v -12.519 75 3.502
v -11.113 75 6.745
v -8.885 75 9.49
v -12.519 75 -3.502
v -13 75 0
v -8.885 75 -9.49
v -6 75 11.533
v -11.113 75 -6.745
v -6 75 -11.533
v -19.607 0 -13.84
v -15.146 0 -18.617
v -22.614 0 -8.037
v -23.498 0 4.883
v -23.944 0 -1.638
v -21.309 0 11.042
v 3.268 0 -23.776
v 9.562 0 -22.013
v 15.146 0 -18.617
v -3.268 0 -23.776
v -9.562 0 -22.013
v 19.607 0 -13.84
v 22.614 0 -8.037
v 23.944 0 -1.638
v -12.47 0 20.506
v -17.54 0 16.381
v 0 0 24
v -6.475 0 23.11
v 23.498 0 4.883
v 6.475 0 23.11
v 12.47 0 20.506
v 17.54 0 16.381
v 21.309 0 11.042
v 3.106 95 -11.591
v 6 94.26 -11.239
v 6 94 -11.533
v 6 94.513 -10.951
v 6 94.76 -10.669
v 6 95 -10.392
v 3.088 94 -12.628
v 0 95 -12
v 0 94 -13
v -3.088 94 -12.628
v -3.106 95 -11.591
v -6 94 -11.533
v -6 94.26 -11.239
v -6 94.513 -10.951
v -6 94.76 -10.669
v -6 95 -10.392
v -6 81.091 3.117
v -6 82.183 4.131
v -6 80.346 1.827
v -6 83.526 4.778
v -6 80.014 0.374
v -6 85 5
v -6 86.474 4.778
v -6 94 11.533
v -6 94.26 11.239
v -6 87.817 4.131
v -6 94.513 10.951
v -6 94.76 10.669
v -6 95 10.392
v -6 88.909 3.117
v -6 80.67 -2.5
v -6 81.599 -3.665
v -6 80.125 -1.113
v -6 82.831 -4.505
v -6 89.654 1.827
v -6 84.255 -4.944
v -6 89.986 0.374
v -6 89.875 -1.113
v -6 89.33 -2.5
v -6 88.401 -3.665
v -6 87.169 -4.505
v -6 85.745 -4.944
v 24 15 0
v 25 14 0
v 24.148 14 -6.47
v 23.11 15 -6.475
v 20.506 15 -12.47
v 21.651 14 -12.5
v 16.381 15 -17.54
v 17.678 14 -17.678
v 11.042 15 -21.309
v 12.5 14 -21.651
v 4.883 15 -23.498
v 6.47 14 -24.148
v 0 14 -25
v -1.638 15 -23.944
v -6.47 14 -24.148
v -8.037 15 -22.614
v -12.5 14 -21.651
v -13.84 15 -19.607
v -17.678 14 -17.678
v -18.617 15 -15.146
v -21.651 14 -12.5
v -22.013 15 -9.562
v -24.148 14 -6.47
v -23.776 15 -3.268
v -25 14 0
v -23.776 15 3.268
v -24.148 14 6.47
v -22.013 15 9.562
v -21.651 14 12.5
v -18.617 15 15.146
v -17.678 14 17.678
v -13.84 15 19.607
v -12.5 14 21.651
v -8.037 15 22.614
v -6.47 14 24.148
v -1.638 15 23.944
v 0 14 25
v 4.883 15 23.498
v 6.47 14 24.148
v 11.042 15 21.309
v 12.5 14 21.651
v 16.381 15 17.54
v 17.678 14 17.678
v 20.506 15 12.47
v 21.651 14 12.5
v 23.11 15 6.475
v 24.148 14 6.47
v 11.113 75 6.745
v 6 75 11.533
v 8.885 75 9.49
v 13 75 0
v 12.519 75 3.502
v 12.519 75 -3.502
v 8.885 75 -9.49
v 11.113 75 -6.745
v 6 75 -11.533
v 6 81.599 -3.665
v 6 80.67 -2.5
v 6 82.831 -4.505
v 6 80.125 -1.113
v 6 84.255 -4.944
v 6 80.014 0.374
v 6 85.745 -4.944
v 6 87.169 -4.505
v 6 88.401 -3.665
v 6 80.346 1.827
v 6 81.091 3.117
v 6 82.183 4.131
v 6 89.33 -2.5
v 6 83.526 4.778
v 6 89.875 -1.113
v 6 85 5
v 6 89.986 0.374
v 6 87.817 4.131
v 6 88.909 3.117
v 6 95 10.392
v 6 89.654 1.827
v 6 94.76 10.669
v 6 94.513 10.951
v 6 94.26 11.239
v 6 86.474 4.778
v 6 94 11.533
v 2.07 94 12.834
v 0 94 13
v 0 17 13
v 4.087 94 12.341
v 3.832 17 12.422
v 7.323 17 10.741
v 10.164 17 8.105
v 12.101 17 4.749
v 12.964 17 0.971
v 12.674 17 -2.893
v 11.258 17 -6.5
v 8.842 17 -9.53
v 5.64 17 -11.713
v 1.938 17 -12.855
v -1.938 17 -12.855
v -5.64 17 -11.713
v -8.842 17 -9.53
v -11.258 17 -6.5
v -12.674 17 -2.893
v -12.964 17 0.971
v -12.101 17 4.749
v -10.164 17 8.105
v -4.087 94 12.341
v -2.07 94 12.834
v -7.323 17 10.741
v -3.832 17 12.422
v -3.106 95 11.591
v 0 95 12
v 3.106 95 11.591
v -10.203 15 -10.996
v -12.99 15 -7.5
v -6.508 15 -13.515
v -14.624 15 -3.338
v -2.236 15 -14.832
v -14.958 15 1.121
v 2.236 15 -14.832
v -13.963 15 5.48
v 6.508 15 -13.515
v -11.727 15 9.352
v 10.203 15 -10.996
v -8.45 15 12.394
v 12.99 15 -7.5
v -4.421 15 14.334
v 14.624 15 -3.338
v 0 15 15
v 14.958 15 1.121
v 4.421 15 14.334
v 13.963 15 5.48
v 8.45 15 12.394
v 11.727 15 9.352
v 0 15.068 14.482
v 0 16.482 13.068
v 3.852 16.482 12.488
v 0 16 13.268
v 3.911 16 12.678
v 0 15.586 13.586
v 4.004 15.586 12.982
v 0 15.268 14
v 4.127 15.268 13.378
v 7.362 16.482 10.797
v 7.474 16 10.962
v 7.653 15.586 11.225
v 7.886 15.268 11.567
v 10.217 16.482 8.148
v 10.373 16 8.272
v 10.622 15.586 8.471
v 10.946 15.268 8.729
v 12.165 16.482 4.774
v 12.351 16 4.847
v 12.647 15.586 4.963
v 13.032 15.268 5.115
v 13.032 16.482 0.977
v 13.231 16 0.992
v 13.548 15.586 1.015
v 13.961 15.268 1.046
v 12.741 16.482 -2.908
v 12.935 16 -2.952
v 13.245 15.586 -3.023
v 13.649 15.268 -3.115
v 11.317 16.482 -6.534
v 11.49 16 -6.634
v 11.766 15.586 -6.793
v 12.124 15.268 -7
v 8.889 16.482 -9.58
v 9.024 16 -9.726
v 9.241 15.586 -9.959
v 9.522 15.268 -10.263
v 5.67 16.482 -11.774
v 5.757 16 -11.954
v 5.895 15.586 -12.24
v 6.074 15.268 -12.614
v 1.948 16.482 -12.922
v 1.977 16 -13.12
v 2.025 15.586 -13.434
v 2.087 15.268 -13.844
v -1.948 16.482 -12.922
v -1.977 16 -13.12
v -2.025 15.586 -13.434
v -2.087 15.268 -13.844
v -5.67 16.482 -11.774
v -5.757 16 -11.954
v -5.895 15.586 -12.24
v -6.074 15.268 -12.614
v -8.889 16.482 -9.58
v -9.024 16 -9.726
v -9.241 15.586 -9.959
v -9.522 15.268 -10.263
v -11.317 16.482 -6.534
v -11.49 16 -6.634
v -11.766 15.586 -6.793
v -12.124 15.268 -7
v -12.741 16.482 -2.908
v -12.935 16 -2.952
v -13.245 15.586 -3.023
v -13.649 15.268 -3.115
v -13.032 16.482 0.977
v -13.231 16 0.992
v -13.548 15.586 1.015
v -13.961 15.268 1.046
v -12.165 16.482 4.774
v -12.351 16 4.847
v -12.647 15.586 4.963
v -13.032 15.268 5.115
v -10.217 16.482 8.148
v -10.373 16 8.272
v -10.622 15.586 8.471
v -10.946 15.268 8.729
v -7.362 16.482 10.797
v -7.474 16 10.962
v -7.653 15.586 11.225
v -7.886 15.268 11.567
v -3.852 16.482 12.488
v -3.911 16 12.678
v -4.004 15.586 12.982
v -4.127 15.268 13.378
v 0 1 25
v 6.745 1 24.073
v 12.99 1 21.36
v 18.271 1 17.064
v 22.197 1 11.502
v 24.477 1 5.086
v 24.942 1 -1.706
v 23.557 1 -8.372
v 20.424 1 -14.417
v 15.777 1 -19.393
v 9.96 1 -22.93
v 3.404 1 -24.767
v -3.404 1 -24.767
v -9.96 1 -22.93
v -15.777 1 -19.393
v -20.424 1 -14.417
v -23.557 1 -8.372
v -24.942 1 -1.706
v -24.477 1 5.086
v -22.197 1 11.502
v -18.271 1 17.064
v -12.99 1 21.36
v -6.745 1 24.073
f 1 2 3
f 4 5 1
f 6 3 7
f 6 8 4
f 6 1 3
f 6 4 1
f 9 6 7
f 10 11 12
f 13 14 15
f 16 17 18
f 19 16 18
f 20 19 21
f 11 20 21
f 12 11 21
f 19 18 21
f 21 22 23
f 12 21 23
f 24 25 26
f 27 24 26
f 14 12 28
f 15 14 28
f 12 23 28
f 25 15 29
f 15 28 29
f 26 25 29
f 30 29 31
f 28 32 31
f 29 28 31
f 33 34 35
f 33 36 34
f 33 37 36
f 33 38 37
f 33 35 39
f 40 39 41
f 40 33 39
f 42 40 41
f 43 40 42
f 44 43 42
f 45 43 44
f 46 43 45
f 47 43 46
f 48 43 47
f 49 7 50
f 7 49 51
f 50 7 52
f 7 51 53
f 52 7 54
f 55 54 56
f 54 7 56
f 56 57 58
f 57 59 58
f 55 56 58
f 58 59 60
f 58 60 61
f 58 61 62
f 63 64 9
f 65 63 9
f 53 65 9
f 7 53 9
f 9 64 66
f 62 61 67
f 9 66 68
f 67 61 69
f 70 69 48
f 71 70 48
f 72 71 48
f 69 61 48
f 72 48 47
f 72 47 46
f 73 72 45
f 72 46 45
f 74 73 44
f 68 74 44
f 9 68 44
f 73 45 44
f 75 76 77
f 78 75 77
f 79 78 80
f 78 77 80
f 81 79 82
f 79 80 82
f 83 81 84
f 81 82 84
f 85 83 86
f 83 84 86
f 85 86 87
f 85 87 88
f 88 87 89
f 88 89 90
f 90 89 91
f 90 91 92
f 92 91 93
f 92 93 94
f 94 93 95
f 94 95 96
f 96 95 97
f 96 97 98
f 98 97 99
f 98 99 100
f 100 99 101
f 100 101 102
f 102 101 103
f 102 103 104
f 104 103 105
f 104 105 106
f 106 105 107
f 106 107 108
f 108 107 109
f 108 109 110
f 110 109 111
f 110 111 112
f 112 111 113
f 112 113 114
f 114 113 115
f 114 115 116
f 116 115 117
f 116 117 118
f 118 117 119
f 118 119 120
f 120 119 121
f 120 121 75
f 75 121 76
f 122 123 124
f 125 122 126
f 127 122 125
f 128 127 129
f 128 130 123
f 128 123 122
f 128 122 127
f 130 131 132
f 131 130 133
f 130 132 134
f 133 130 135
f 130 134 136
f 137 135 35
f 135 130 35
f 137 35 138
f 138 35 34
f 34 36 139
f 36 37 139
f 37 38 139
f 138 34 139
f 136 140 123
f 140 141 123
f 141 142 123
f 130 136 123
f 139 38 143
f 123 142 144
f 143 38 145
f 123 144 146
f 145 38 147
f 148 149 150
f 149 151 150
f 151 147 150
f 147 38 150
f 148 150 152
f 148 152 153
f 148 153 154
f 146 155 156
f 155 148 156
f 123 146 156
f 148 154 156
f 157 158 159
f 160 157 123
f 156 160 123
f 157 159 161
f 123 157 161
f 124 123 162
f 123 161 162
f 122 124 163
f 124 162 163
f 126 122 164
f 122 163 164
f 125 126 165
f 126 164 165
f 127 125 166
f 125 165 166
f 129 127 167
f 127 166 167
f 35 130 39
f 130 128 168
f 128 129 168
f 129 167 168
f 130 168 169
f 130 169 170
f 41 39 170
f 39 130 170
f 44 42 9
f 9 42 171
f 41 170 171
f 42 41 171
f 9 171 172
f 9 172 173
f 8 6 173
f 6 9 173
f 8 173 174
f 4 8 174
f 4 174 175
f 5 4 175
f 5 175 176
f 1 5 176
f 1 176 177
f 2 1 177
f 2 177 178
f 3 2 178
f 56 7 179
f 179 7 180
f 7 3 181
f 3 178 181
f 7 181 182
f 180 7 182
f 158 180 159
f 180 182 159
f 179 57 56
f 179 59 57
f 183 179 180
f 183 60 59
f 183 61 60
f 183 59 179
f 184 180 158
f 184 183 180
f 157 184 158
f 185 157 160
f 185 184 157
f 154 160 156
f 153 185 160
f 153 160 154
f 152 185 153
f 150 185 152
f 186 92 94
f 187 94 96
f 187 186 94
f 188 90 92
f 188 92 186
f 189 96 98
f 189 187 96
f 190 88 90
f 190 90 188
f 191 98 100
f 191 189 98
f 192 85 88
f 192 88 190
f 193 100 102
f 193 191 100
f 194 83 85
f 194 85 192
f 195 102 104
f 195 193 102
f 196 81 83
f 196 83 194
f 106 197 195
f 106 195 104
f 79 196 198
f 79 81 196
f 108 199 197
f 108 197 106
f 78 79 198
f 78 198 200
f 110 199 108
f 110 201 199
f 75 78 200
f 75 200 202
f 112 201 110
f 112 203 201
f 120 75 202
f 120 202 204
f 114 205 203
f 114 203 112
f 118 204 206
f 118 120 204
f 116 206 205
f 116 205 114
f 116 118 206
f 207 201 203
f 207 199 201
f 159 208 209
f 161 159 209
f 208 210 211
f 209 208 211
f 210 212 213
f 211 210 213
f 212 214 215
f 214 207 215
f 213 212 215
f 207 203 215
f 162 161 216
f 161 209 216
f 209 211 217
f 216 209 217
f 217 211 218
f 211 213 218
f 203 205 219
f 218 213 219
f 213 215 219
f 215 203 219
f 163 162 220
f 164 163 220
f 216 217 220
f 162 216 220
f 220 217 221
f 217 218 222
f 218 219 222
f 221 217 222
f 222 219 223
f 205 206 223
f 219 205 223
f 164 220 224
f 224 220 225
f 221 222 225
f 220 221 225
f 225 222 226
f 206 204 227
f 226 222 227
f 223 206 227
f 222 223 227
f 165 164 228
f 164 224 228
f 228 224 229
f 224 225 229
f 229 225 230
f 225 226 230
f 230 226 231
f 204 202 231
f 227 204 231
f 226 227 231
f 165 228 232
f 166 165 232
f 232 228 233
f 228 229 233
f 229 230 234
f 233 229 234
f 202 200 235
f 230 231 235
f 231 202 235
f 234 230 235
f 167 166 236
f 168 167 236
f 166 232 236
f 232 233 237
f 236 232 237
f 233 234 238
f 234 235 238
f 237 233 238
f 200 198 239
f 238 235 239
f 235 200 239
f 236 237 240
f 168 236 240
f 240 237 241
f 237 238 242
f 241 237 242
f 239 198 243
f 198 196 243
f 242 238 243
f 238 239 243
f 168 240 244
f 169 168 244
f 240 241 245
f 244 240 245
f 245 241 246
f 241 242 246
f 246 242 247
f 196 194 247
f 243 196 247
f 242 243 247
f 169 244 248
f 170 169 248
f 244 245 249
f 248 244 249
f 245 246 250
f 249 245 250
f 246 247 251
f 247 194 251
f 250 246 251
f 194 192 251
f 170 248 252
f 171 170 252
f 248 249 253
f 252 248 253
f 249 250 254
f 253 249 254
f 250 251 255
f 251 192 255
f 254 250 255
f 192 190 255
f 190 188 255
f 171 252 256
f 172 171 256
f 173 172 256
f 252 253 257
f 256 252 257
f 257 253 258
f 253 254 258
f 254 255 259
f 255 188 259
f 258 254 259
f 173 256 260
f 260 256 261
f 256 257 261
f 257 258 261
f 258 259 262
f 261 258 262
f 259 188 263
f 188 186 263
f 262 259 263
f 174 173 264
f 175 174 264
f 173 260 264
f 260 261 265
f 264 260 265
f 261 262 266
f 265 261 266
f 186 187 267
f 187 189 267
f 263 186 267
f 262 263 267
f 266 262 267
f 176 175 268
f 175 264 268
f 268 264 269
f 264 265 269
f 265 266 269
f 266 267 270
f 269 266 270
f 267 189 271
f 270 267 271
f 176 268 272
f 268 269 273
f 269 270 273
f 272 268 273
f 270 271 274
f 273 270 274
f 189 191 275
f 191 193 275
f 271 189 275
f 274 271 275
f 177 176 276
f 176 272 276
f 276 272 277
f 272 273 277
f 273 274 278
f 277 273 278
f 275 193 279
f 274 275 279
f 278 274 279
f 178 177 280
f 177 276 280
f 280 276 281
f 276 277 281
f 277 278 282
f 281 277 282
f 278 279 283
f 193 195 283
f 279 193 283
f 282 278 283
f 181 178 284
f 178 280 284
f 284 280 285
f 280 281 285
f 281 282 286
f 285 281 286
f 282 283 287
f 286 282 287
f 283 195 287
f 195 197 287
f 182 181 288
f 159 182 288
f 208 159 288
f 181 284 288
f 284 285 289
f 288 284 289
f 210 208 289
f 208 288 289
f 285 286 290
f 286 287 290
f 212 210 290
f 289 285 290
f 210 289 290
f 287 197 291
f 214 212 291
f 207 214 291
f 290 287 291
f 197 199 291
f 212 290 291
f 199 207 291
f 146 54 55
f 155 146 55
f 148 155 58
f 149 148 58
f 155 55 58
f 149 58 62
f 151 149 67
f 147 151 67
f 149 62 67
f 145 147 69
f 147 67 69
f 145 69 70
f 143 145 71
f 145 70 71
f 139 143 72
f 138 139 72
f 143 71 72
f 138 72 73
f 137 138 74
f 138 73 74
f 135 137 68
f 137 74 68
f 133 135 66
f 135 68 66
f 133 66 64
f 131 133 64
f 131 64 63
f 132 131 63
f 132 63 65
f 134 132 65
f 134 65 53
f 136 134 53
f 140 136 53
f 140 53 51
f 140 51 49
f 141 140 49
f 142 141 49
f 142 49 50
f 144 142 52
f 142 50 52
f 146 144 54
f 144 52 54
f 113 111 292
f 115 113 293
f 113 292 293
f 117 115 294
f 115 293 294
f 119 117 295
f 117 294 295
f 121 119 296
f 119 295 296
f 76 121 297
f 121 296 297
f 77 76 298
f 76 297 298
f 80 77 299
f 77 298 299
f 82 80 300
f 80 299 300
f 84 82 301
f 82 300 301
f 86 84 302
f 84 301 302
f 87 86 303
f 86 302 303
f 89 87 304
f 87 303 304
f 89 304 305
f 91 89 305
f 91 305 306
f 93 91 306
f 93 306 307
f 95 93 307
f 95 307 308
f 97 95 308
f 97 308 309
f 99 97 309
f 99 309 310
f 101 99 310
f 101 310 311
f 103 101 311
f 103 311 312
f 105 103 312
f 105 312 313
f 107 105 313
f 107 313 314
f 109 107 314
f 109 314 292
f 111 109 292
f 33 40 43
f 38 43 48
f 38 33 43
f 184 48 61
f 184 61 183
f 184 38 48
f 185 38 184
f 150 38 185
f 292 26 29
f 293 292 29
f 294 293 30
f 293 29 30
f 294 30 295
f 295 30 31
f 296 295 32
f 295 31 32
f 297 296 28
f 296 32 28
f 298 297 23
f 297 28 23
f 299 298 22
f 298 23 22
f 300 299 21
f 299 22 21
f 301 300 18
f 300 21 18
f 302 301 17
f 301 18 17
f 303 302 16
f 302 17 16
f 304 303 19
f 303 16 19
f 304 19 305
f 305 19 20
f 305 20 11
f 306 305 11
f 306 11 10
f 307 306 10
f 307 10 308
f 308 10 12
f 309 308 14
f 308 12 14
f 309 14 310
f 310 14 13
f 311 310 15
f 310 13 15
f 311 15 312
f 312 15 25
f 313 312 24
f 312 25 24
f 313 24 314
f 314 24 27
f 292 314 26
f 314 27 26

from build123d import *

# Parameters (mm, degrees)
SZKIC2_R                    = 25
DODANIE_WYCI_GNI_CIE1_DEPTH = 15
SZKIC3_R                    = 13
DODANIE_WYCI_GNI_CIE2_DEPTH = 80
CHAMFER2_SIZE               = 1
CHAMFER3_SIZE               = 1
FILLET1_R                   = 2
CUT_EXTRUDE1_DEPTH          = 20
SKETCH4_R                   = 5
CUT_EXTRUDE3_DEPTH          = 12


with BuildPart() as part:
    # Szkic2 → Dodanie-wyciągnięcie1 (new body)
    with BuildSketch(Plane(origin=(0, 0, 0), x_dir=(1, 0, 0), z_dir=(0, 1, 0))):
        with Locations(Location((0, 0, 0), (0, 0, 270))):
            Circle(SZKIC2_R)
    extrude(amount=DODANIE_WYCI_GNI_CIE1_DEPTH)

    # Szkic3 → Dodanie-wyciągnięcie2 (add)
    with BuildSketch(Plane(origin=(0, 15, 0), x_dir=(1, 0, 0), z_dir=(0, 1, 0))):
        with Locations(Location((0, 0, 0), (0, 0, 270))):
            Circle(SZKIC3_R)
    extrude(amount=DODANIE_WYCI_GNI_CIE2_DEPTH)

    # Chamfer1: read off the stored shape, not the designer's step
    # Chamfer1 outline → Chamfer1 (revolve, cut)
    with BuildSketch(Plane.XY):
        Polygon((25, 15), (24, 15), (25, 14), align=None)
    revolve(axis=Axis((0, 0, 0), (0, 1, 0)), mode=Mode.SUBTRACT)

    # Chamfer2
    chamfer2_edges = [part.edges().sort_by_distance(p)[0] for p in [
        (0, 0, -25),
    ]]
    chamfer(chamfer2_edges, length=CHAMFER2_SIZE)

    # Chamfer3
    chamfer3_edges = [part.edges().sort_by_distance(p)[0] for p in [
        (0, 95, -13),
    ]]
    chamfer(chamfer3_edges, length=CHAMFER3_SIZE)

    # Fillet1
    fillet1_edges = [part.edges().sort_by_distance(p)[0] for p in [
        (0, 15, -13),
    ]]
    fillet(fillet1_edges, radius=FILLET1_R)

    # Sketch2 → Cut-Extrude1 (cut)
    with BuildSketch(Plane(origin=(0, 95, 0), x_dir=(1, 0, 0), z_dir=(0, 1, 0))):
        with BuildLine():
            Line((6, 11.993862748), (6, -11.993862748))
            ThreePointArc((6, -11.993862748), (13.41091882, 0), (6, 11.993862748))
        make_face()
        with BuildLine():
            Line((-6, -11.993862748), (-6, 11.993862748))
            ThreePointArc((-6, 11.993862748), (-13.41091882, 0), (-6, -11.993862748))
        make_face()
    extrude(amount=-CUT_EXTRUDE1_DEPTH, mode=Mode.SUBTRACT)

    # Sketch4 → Cut-Extrude3 (cut)
    with BuildSketch(Plane.ZY.offset(6)):
        with Locations((0, 85)):
            Circle(SKETCH4_R)
    extrude(amount=-CUT_EXTRUDE3_DEPTH, mode=Mode.SUBTRACT)


solid = part.part
